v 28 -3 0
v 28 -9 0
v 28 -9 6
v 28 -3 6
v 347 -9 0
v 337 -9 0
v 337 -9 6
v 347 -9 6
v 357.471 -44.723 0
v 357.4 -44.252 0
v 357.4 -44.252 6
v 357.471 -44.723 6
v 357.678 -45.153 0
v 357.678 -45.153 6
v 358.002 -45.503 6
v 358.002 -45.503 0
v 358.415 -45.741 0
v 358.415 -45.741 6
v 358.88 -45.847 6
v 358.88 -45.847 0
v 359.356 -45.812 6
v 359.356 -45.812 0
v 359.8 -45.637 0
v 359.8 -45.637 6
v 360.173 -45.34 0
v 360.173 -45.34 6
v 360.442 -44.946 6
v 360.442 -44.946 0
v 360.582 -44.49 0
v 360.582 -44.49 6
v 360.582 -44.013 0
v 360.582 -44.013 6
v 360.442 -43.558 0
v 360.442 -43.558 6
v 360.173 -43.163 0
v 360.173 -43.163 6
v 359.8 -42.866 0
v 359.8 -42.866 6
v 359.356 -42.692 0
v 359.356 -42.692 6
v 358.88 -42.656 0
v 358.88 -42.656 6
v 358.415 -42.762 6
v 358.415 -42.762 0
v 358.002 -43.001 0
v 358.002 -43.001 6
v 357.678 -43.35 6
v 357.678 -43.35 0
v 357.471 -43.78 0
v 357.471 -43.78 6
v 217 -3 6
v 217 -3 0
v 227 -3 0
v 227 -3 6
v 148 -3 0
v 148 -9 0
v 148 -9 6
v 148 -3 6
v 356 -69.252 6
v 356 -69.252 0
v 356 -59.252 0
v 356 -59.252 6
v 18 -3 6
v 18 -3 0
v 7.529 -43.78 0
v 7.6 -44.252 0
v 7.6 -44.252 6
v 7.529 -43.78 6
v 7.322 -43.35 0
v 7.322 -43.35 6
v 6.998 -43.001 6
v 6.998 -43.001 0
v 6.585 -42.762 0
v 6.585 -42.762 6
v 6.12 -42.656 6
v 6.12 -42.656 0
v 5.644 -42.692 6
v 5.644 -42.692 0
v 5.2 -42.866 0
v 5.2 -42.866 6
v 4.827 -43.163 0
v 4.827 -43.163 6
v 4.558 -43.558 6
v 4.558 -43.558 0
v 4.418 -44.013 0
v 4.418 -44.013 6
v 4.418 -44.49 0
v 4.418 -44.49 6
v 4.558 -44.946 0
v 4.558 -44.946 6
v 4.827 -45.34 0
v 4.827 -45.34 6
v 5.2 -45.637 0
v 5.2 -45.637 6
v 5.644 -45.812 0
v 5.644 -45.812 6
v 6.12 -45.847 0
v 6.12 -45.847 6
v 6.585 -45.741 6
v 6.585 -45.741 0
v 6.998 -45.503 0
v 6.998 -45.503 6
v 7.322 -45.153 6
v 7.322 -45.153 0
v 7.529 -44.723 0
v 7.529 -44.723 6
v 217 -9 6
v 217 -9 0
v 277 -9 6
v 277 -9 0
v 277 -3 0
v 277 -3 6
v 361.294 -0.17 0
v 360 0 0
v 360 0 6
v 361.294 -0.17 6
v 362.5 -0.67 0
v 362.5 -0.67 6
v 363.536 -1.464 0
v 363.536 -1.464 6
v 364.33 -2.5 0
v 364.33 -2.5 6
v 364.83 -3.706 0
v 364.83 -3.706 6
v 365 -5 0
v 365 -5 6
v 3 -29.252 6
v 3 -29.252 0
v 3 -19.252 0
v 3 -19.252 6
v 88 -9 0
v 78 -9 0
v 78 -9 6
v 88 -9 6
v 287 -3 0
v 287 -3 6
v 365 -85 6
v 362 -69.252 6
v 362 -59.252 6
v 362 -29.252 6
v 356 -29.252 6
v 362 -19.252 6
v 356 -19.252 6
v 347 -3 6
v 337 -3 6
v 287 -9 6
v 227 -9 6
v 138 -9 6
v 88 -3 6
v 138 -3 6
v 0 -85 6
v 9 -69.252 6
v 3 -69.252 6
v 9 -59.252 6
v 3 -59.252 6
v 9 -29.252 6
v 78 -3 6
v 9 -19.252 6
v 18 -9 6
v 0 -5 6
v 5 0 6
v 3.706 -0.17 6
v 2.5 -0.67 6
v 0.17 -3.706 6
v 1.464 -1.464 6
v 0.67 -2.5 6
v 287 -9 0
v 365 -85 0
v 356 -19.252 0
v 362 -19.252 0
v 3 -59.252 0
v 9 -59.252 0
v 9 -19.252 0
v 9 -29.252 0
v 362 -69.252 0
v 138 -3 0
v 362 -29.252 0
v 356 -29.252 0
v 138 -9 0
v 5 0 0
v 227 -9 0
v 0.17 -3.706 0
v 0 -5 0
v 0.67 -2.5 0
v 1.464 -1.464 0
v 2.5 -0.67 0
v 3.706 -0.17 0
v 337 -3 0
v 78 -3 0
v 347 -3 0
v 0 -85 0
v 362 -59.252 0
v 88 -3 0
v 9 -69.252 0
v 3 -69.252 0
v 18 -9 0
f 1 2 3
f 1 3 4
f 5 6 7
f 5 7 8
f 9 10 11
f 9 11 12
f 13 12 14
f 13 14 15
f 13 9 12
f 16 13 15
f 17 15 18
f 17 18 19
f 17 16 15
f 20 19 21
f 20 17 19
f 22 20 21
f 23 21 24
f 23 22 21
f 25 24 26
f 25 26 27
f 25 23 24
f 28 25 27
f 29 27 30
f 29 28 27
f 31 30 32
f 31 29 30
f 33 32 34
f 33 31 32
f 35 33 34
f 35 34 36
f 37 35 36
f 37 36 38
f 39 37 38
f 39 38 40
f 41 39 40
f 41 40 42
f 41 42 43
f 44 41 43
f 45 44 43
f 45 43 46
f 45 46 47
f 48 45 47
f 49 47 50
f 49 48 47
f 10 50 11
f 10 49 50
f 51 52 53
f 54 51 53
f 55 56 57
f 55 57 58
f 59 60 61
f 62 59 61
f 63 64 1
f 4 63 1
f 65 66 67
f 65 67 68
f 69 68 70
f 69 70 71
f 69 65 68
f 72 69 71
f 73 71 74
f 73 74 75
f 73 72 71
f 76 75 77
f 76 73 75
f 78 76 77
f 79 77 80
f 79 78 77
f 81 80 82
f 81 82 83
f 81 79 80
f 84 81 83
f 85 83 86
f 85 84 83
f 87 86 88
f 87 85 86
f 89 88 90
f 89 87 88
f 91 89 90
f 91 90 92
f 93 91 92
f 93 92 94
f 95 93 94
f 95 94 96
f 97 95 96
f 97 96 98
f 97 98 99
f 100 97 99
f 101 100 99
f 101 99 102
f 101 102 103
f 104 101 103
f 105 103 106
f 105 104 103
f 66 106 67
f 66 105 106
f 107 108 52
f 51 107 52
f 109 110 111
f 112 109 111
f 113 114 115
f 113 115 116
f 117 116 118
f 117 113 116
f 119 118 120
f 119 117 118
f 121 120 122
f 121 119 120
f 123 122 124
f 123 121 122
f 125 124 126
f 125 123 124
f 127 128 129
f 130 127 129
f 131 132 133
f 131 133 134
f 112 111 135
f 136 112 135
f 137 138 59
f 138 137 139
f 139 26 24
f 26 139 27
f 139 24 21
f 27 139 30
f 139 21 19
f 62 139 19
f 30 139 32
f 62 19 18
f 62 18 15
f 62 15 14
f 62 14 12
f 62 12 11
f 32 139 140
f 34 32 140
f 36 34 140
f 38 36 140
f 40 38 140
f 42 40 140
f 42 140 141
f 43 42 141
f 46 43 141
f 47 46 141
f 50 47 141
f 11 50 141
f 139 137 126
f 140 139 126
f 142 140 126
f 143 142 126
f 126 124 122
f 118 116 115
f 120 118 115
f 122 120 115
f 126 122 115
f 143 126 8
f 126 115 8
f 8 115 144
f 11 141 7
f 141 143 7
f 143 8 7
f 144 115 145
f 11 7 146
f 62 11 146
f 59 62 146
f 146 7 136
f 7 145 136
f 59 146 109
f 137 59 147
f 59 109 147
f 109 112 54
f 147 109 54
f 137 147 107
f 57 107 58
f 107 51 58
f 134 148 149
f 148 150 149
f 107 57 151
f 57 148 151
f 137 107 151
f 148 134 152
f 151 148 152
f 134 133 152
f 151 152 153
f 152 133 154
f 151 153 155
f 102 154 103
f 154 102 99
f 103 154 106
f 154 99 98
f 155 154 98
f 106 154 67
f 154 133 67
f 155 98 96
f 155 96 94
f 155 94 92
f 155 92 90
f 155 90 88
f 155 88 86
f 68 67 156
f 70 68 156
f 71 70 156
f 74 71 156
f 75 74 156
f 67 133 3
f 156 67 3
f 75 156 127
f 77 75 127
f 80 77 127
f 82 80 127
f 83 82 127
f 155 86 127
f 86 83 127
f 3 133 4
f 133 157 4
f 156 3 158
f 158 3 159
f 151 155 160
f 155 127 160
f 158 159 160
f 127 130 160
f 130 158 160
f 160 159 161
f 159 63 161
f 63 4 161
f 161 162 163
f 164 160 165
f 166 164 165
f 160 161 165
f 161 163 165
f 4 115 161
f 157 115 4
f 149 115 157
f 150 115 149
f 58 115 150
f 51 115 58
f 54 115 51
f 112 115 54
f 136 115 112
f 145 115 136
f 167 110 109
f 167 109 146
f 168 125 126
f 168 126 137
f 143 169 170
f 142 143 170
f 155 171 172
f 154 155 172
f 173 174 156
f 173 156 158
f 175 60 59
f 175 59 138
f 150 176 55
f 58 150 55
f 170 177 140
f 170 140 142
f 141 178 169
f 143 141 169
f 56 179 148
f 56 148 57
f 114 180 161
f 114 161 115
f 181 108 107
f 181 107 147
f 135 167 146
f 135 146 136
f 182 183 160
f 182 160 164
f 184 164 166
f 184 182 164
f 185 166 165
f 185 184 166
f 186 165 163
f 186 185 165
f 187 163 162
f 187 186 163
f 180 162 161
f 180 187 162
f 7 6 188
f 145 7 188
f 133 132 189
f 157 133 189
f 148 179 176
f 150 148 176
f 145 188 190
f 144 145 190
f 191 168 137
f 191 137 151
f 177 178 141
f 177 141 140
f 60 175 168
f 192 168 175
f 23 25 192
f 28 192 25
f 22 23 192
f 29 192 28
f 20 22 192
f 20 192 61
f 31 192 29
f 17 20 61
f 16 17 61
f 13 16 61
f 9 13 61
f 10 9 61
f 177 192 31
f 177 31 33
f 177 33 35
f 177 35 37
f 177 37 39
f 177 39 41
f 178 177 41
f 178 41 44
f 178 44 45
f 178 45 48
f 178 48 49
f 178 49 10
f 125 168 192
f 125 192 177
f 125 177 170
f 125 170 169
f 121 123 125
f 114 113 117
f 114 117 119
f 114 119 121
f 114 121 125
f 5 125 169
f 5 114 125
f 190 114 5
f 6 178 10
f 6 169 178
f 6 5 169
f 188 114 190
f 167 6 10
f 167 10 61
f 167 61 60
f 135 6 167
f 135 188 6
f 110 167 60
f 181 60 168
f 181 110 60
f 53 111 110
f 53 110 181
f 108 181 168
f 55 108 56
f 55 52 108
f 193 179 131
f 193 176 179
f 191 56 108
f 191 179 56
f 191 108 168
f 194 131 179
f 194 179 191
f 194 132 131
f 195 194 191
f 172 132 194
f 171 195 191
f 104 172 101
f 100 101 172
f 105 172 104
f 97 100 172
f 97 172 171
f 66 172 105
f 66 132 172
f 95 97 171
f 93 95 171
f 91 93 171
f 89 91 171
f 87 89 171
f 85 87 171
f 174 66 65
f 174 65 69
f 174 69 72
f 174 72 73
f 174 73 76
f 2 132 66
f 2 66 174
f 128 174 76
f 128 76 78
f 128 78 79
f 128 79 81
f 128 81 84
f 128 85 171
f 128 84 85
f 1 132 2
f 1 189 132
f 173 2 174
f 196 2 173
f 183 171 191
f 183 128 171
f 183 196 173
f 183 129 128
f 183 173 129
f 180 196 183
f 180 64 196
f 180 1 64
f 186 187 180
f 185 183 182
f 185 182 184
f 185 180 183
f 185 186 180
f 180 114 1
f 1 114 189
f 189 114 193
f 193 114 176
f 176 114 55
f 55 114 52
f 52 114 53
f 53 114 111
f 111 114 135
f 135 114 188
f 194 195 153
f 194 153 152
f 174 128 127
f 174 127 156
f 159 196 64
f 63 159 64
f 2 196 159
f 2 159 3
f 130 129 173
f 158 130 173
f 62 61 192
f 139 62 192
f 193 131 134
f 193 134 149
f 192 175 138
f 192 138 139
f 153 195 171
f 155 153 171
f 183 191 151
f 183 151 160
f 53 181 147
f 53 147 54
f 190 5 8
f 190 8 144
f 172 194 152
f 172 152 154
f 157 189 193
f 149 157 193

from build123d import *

# Parameters (mm, degrees)
SKETCH_1_R      = 1.6
SKETCH_1_W      = 6
SKETCH_1_H      = 10
SKETCH_1_W_2    = 10
SKETCH_1_H_2    = 6
EXTRUDE_1_DEPTH = 6


with BuildPart() as part:
    # Эскиз1 → Бобышка-Вытянуть1 (new body)
    with BuildSketch(Plane.XY):
        with BuildLine():
            Line((5, 0), (360, 0))
            ThreePointArc((360, 0), (363.535533906, -1.464466094), (365, -5))
            Line((365, -5), (365, -85))
            Line((365, -85), (0, -85))
            Line((0, -85), (0, -5))
            ThreePointArc((0, -5), (1.464466094, -1.464466094), (5, 0))
        make_face()
        with Locations((6, -44.251742496)):
            Circle(SKETCH_1_R, mode=Mode.SUBTRACT)
        with Locations(Location((359, -44.251742496, 0), (0, 0, 180))):
            Circle(SKETCH_1_R, mode=Mode.SUBTRACT)
        with Locations((6, -64.251742496)):
            Rectangle(SKETCH_1_W, SKETCH_1_H, mode=Mode.SUBTRACT)
        with Locations((6, -24.251742496)):
            Rectangle(SKETCH_1_W, SKETCH_1_H, mode=Mode.SUBTRACT)
        with Locations((359, -24.251742496)):
            Rectangle(SKETCH_1_W, SKETCH_1_H, mode=Mode.SUBTRACT)
        with Locations((359, -64.251742496)):
            Rectangle(SKETCH_1_W, SKETCH_1_H, mode=Mode.SUBTRACT)
        with Locations((83, -6)):
            Rectangle(SKETCH_1_W_2, SKETCH_1_H_2, mode=Mode.SUBTRACT)
        with Locations((23, -6)):
            Rectangle(SKETCH_1_W_2, SKETCH_1_H_2, mode=Mode.SUBTRACT)
        with Locations((143, -6)):
            Rectangle(SKETCH_1_W_2, SKETCH_1_H_2, mode=Mode.SUBTRACT)
        with Locations((222, -6)):
            Rectangle(SKETCH_1_W_2, SKETCH_1_H_2, mode=Mode.SUBTRACT)
        with Locations((282, -6)):
            Rectangle(SKETCH_1_W_2, SKETCH_1_H_2, mode=Mode.SUBTRACT)
        with Locations((342, -6)):
            Rectangle(SKETCH_1_W_2, SKETCH_1_H_2, mode=Mode.SUBTRACT)
    extrude(amount=EXTRUDE_1_DEPTH)


solid = part.part
